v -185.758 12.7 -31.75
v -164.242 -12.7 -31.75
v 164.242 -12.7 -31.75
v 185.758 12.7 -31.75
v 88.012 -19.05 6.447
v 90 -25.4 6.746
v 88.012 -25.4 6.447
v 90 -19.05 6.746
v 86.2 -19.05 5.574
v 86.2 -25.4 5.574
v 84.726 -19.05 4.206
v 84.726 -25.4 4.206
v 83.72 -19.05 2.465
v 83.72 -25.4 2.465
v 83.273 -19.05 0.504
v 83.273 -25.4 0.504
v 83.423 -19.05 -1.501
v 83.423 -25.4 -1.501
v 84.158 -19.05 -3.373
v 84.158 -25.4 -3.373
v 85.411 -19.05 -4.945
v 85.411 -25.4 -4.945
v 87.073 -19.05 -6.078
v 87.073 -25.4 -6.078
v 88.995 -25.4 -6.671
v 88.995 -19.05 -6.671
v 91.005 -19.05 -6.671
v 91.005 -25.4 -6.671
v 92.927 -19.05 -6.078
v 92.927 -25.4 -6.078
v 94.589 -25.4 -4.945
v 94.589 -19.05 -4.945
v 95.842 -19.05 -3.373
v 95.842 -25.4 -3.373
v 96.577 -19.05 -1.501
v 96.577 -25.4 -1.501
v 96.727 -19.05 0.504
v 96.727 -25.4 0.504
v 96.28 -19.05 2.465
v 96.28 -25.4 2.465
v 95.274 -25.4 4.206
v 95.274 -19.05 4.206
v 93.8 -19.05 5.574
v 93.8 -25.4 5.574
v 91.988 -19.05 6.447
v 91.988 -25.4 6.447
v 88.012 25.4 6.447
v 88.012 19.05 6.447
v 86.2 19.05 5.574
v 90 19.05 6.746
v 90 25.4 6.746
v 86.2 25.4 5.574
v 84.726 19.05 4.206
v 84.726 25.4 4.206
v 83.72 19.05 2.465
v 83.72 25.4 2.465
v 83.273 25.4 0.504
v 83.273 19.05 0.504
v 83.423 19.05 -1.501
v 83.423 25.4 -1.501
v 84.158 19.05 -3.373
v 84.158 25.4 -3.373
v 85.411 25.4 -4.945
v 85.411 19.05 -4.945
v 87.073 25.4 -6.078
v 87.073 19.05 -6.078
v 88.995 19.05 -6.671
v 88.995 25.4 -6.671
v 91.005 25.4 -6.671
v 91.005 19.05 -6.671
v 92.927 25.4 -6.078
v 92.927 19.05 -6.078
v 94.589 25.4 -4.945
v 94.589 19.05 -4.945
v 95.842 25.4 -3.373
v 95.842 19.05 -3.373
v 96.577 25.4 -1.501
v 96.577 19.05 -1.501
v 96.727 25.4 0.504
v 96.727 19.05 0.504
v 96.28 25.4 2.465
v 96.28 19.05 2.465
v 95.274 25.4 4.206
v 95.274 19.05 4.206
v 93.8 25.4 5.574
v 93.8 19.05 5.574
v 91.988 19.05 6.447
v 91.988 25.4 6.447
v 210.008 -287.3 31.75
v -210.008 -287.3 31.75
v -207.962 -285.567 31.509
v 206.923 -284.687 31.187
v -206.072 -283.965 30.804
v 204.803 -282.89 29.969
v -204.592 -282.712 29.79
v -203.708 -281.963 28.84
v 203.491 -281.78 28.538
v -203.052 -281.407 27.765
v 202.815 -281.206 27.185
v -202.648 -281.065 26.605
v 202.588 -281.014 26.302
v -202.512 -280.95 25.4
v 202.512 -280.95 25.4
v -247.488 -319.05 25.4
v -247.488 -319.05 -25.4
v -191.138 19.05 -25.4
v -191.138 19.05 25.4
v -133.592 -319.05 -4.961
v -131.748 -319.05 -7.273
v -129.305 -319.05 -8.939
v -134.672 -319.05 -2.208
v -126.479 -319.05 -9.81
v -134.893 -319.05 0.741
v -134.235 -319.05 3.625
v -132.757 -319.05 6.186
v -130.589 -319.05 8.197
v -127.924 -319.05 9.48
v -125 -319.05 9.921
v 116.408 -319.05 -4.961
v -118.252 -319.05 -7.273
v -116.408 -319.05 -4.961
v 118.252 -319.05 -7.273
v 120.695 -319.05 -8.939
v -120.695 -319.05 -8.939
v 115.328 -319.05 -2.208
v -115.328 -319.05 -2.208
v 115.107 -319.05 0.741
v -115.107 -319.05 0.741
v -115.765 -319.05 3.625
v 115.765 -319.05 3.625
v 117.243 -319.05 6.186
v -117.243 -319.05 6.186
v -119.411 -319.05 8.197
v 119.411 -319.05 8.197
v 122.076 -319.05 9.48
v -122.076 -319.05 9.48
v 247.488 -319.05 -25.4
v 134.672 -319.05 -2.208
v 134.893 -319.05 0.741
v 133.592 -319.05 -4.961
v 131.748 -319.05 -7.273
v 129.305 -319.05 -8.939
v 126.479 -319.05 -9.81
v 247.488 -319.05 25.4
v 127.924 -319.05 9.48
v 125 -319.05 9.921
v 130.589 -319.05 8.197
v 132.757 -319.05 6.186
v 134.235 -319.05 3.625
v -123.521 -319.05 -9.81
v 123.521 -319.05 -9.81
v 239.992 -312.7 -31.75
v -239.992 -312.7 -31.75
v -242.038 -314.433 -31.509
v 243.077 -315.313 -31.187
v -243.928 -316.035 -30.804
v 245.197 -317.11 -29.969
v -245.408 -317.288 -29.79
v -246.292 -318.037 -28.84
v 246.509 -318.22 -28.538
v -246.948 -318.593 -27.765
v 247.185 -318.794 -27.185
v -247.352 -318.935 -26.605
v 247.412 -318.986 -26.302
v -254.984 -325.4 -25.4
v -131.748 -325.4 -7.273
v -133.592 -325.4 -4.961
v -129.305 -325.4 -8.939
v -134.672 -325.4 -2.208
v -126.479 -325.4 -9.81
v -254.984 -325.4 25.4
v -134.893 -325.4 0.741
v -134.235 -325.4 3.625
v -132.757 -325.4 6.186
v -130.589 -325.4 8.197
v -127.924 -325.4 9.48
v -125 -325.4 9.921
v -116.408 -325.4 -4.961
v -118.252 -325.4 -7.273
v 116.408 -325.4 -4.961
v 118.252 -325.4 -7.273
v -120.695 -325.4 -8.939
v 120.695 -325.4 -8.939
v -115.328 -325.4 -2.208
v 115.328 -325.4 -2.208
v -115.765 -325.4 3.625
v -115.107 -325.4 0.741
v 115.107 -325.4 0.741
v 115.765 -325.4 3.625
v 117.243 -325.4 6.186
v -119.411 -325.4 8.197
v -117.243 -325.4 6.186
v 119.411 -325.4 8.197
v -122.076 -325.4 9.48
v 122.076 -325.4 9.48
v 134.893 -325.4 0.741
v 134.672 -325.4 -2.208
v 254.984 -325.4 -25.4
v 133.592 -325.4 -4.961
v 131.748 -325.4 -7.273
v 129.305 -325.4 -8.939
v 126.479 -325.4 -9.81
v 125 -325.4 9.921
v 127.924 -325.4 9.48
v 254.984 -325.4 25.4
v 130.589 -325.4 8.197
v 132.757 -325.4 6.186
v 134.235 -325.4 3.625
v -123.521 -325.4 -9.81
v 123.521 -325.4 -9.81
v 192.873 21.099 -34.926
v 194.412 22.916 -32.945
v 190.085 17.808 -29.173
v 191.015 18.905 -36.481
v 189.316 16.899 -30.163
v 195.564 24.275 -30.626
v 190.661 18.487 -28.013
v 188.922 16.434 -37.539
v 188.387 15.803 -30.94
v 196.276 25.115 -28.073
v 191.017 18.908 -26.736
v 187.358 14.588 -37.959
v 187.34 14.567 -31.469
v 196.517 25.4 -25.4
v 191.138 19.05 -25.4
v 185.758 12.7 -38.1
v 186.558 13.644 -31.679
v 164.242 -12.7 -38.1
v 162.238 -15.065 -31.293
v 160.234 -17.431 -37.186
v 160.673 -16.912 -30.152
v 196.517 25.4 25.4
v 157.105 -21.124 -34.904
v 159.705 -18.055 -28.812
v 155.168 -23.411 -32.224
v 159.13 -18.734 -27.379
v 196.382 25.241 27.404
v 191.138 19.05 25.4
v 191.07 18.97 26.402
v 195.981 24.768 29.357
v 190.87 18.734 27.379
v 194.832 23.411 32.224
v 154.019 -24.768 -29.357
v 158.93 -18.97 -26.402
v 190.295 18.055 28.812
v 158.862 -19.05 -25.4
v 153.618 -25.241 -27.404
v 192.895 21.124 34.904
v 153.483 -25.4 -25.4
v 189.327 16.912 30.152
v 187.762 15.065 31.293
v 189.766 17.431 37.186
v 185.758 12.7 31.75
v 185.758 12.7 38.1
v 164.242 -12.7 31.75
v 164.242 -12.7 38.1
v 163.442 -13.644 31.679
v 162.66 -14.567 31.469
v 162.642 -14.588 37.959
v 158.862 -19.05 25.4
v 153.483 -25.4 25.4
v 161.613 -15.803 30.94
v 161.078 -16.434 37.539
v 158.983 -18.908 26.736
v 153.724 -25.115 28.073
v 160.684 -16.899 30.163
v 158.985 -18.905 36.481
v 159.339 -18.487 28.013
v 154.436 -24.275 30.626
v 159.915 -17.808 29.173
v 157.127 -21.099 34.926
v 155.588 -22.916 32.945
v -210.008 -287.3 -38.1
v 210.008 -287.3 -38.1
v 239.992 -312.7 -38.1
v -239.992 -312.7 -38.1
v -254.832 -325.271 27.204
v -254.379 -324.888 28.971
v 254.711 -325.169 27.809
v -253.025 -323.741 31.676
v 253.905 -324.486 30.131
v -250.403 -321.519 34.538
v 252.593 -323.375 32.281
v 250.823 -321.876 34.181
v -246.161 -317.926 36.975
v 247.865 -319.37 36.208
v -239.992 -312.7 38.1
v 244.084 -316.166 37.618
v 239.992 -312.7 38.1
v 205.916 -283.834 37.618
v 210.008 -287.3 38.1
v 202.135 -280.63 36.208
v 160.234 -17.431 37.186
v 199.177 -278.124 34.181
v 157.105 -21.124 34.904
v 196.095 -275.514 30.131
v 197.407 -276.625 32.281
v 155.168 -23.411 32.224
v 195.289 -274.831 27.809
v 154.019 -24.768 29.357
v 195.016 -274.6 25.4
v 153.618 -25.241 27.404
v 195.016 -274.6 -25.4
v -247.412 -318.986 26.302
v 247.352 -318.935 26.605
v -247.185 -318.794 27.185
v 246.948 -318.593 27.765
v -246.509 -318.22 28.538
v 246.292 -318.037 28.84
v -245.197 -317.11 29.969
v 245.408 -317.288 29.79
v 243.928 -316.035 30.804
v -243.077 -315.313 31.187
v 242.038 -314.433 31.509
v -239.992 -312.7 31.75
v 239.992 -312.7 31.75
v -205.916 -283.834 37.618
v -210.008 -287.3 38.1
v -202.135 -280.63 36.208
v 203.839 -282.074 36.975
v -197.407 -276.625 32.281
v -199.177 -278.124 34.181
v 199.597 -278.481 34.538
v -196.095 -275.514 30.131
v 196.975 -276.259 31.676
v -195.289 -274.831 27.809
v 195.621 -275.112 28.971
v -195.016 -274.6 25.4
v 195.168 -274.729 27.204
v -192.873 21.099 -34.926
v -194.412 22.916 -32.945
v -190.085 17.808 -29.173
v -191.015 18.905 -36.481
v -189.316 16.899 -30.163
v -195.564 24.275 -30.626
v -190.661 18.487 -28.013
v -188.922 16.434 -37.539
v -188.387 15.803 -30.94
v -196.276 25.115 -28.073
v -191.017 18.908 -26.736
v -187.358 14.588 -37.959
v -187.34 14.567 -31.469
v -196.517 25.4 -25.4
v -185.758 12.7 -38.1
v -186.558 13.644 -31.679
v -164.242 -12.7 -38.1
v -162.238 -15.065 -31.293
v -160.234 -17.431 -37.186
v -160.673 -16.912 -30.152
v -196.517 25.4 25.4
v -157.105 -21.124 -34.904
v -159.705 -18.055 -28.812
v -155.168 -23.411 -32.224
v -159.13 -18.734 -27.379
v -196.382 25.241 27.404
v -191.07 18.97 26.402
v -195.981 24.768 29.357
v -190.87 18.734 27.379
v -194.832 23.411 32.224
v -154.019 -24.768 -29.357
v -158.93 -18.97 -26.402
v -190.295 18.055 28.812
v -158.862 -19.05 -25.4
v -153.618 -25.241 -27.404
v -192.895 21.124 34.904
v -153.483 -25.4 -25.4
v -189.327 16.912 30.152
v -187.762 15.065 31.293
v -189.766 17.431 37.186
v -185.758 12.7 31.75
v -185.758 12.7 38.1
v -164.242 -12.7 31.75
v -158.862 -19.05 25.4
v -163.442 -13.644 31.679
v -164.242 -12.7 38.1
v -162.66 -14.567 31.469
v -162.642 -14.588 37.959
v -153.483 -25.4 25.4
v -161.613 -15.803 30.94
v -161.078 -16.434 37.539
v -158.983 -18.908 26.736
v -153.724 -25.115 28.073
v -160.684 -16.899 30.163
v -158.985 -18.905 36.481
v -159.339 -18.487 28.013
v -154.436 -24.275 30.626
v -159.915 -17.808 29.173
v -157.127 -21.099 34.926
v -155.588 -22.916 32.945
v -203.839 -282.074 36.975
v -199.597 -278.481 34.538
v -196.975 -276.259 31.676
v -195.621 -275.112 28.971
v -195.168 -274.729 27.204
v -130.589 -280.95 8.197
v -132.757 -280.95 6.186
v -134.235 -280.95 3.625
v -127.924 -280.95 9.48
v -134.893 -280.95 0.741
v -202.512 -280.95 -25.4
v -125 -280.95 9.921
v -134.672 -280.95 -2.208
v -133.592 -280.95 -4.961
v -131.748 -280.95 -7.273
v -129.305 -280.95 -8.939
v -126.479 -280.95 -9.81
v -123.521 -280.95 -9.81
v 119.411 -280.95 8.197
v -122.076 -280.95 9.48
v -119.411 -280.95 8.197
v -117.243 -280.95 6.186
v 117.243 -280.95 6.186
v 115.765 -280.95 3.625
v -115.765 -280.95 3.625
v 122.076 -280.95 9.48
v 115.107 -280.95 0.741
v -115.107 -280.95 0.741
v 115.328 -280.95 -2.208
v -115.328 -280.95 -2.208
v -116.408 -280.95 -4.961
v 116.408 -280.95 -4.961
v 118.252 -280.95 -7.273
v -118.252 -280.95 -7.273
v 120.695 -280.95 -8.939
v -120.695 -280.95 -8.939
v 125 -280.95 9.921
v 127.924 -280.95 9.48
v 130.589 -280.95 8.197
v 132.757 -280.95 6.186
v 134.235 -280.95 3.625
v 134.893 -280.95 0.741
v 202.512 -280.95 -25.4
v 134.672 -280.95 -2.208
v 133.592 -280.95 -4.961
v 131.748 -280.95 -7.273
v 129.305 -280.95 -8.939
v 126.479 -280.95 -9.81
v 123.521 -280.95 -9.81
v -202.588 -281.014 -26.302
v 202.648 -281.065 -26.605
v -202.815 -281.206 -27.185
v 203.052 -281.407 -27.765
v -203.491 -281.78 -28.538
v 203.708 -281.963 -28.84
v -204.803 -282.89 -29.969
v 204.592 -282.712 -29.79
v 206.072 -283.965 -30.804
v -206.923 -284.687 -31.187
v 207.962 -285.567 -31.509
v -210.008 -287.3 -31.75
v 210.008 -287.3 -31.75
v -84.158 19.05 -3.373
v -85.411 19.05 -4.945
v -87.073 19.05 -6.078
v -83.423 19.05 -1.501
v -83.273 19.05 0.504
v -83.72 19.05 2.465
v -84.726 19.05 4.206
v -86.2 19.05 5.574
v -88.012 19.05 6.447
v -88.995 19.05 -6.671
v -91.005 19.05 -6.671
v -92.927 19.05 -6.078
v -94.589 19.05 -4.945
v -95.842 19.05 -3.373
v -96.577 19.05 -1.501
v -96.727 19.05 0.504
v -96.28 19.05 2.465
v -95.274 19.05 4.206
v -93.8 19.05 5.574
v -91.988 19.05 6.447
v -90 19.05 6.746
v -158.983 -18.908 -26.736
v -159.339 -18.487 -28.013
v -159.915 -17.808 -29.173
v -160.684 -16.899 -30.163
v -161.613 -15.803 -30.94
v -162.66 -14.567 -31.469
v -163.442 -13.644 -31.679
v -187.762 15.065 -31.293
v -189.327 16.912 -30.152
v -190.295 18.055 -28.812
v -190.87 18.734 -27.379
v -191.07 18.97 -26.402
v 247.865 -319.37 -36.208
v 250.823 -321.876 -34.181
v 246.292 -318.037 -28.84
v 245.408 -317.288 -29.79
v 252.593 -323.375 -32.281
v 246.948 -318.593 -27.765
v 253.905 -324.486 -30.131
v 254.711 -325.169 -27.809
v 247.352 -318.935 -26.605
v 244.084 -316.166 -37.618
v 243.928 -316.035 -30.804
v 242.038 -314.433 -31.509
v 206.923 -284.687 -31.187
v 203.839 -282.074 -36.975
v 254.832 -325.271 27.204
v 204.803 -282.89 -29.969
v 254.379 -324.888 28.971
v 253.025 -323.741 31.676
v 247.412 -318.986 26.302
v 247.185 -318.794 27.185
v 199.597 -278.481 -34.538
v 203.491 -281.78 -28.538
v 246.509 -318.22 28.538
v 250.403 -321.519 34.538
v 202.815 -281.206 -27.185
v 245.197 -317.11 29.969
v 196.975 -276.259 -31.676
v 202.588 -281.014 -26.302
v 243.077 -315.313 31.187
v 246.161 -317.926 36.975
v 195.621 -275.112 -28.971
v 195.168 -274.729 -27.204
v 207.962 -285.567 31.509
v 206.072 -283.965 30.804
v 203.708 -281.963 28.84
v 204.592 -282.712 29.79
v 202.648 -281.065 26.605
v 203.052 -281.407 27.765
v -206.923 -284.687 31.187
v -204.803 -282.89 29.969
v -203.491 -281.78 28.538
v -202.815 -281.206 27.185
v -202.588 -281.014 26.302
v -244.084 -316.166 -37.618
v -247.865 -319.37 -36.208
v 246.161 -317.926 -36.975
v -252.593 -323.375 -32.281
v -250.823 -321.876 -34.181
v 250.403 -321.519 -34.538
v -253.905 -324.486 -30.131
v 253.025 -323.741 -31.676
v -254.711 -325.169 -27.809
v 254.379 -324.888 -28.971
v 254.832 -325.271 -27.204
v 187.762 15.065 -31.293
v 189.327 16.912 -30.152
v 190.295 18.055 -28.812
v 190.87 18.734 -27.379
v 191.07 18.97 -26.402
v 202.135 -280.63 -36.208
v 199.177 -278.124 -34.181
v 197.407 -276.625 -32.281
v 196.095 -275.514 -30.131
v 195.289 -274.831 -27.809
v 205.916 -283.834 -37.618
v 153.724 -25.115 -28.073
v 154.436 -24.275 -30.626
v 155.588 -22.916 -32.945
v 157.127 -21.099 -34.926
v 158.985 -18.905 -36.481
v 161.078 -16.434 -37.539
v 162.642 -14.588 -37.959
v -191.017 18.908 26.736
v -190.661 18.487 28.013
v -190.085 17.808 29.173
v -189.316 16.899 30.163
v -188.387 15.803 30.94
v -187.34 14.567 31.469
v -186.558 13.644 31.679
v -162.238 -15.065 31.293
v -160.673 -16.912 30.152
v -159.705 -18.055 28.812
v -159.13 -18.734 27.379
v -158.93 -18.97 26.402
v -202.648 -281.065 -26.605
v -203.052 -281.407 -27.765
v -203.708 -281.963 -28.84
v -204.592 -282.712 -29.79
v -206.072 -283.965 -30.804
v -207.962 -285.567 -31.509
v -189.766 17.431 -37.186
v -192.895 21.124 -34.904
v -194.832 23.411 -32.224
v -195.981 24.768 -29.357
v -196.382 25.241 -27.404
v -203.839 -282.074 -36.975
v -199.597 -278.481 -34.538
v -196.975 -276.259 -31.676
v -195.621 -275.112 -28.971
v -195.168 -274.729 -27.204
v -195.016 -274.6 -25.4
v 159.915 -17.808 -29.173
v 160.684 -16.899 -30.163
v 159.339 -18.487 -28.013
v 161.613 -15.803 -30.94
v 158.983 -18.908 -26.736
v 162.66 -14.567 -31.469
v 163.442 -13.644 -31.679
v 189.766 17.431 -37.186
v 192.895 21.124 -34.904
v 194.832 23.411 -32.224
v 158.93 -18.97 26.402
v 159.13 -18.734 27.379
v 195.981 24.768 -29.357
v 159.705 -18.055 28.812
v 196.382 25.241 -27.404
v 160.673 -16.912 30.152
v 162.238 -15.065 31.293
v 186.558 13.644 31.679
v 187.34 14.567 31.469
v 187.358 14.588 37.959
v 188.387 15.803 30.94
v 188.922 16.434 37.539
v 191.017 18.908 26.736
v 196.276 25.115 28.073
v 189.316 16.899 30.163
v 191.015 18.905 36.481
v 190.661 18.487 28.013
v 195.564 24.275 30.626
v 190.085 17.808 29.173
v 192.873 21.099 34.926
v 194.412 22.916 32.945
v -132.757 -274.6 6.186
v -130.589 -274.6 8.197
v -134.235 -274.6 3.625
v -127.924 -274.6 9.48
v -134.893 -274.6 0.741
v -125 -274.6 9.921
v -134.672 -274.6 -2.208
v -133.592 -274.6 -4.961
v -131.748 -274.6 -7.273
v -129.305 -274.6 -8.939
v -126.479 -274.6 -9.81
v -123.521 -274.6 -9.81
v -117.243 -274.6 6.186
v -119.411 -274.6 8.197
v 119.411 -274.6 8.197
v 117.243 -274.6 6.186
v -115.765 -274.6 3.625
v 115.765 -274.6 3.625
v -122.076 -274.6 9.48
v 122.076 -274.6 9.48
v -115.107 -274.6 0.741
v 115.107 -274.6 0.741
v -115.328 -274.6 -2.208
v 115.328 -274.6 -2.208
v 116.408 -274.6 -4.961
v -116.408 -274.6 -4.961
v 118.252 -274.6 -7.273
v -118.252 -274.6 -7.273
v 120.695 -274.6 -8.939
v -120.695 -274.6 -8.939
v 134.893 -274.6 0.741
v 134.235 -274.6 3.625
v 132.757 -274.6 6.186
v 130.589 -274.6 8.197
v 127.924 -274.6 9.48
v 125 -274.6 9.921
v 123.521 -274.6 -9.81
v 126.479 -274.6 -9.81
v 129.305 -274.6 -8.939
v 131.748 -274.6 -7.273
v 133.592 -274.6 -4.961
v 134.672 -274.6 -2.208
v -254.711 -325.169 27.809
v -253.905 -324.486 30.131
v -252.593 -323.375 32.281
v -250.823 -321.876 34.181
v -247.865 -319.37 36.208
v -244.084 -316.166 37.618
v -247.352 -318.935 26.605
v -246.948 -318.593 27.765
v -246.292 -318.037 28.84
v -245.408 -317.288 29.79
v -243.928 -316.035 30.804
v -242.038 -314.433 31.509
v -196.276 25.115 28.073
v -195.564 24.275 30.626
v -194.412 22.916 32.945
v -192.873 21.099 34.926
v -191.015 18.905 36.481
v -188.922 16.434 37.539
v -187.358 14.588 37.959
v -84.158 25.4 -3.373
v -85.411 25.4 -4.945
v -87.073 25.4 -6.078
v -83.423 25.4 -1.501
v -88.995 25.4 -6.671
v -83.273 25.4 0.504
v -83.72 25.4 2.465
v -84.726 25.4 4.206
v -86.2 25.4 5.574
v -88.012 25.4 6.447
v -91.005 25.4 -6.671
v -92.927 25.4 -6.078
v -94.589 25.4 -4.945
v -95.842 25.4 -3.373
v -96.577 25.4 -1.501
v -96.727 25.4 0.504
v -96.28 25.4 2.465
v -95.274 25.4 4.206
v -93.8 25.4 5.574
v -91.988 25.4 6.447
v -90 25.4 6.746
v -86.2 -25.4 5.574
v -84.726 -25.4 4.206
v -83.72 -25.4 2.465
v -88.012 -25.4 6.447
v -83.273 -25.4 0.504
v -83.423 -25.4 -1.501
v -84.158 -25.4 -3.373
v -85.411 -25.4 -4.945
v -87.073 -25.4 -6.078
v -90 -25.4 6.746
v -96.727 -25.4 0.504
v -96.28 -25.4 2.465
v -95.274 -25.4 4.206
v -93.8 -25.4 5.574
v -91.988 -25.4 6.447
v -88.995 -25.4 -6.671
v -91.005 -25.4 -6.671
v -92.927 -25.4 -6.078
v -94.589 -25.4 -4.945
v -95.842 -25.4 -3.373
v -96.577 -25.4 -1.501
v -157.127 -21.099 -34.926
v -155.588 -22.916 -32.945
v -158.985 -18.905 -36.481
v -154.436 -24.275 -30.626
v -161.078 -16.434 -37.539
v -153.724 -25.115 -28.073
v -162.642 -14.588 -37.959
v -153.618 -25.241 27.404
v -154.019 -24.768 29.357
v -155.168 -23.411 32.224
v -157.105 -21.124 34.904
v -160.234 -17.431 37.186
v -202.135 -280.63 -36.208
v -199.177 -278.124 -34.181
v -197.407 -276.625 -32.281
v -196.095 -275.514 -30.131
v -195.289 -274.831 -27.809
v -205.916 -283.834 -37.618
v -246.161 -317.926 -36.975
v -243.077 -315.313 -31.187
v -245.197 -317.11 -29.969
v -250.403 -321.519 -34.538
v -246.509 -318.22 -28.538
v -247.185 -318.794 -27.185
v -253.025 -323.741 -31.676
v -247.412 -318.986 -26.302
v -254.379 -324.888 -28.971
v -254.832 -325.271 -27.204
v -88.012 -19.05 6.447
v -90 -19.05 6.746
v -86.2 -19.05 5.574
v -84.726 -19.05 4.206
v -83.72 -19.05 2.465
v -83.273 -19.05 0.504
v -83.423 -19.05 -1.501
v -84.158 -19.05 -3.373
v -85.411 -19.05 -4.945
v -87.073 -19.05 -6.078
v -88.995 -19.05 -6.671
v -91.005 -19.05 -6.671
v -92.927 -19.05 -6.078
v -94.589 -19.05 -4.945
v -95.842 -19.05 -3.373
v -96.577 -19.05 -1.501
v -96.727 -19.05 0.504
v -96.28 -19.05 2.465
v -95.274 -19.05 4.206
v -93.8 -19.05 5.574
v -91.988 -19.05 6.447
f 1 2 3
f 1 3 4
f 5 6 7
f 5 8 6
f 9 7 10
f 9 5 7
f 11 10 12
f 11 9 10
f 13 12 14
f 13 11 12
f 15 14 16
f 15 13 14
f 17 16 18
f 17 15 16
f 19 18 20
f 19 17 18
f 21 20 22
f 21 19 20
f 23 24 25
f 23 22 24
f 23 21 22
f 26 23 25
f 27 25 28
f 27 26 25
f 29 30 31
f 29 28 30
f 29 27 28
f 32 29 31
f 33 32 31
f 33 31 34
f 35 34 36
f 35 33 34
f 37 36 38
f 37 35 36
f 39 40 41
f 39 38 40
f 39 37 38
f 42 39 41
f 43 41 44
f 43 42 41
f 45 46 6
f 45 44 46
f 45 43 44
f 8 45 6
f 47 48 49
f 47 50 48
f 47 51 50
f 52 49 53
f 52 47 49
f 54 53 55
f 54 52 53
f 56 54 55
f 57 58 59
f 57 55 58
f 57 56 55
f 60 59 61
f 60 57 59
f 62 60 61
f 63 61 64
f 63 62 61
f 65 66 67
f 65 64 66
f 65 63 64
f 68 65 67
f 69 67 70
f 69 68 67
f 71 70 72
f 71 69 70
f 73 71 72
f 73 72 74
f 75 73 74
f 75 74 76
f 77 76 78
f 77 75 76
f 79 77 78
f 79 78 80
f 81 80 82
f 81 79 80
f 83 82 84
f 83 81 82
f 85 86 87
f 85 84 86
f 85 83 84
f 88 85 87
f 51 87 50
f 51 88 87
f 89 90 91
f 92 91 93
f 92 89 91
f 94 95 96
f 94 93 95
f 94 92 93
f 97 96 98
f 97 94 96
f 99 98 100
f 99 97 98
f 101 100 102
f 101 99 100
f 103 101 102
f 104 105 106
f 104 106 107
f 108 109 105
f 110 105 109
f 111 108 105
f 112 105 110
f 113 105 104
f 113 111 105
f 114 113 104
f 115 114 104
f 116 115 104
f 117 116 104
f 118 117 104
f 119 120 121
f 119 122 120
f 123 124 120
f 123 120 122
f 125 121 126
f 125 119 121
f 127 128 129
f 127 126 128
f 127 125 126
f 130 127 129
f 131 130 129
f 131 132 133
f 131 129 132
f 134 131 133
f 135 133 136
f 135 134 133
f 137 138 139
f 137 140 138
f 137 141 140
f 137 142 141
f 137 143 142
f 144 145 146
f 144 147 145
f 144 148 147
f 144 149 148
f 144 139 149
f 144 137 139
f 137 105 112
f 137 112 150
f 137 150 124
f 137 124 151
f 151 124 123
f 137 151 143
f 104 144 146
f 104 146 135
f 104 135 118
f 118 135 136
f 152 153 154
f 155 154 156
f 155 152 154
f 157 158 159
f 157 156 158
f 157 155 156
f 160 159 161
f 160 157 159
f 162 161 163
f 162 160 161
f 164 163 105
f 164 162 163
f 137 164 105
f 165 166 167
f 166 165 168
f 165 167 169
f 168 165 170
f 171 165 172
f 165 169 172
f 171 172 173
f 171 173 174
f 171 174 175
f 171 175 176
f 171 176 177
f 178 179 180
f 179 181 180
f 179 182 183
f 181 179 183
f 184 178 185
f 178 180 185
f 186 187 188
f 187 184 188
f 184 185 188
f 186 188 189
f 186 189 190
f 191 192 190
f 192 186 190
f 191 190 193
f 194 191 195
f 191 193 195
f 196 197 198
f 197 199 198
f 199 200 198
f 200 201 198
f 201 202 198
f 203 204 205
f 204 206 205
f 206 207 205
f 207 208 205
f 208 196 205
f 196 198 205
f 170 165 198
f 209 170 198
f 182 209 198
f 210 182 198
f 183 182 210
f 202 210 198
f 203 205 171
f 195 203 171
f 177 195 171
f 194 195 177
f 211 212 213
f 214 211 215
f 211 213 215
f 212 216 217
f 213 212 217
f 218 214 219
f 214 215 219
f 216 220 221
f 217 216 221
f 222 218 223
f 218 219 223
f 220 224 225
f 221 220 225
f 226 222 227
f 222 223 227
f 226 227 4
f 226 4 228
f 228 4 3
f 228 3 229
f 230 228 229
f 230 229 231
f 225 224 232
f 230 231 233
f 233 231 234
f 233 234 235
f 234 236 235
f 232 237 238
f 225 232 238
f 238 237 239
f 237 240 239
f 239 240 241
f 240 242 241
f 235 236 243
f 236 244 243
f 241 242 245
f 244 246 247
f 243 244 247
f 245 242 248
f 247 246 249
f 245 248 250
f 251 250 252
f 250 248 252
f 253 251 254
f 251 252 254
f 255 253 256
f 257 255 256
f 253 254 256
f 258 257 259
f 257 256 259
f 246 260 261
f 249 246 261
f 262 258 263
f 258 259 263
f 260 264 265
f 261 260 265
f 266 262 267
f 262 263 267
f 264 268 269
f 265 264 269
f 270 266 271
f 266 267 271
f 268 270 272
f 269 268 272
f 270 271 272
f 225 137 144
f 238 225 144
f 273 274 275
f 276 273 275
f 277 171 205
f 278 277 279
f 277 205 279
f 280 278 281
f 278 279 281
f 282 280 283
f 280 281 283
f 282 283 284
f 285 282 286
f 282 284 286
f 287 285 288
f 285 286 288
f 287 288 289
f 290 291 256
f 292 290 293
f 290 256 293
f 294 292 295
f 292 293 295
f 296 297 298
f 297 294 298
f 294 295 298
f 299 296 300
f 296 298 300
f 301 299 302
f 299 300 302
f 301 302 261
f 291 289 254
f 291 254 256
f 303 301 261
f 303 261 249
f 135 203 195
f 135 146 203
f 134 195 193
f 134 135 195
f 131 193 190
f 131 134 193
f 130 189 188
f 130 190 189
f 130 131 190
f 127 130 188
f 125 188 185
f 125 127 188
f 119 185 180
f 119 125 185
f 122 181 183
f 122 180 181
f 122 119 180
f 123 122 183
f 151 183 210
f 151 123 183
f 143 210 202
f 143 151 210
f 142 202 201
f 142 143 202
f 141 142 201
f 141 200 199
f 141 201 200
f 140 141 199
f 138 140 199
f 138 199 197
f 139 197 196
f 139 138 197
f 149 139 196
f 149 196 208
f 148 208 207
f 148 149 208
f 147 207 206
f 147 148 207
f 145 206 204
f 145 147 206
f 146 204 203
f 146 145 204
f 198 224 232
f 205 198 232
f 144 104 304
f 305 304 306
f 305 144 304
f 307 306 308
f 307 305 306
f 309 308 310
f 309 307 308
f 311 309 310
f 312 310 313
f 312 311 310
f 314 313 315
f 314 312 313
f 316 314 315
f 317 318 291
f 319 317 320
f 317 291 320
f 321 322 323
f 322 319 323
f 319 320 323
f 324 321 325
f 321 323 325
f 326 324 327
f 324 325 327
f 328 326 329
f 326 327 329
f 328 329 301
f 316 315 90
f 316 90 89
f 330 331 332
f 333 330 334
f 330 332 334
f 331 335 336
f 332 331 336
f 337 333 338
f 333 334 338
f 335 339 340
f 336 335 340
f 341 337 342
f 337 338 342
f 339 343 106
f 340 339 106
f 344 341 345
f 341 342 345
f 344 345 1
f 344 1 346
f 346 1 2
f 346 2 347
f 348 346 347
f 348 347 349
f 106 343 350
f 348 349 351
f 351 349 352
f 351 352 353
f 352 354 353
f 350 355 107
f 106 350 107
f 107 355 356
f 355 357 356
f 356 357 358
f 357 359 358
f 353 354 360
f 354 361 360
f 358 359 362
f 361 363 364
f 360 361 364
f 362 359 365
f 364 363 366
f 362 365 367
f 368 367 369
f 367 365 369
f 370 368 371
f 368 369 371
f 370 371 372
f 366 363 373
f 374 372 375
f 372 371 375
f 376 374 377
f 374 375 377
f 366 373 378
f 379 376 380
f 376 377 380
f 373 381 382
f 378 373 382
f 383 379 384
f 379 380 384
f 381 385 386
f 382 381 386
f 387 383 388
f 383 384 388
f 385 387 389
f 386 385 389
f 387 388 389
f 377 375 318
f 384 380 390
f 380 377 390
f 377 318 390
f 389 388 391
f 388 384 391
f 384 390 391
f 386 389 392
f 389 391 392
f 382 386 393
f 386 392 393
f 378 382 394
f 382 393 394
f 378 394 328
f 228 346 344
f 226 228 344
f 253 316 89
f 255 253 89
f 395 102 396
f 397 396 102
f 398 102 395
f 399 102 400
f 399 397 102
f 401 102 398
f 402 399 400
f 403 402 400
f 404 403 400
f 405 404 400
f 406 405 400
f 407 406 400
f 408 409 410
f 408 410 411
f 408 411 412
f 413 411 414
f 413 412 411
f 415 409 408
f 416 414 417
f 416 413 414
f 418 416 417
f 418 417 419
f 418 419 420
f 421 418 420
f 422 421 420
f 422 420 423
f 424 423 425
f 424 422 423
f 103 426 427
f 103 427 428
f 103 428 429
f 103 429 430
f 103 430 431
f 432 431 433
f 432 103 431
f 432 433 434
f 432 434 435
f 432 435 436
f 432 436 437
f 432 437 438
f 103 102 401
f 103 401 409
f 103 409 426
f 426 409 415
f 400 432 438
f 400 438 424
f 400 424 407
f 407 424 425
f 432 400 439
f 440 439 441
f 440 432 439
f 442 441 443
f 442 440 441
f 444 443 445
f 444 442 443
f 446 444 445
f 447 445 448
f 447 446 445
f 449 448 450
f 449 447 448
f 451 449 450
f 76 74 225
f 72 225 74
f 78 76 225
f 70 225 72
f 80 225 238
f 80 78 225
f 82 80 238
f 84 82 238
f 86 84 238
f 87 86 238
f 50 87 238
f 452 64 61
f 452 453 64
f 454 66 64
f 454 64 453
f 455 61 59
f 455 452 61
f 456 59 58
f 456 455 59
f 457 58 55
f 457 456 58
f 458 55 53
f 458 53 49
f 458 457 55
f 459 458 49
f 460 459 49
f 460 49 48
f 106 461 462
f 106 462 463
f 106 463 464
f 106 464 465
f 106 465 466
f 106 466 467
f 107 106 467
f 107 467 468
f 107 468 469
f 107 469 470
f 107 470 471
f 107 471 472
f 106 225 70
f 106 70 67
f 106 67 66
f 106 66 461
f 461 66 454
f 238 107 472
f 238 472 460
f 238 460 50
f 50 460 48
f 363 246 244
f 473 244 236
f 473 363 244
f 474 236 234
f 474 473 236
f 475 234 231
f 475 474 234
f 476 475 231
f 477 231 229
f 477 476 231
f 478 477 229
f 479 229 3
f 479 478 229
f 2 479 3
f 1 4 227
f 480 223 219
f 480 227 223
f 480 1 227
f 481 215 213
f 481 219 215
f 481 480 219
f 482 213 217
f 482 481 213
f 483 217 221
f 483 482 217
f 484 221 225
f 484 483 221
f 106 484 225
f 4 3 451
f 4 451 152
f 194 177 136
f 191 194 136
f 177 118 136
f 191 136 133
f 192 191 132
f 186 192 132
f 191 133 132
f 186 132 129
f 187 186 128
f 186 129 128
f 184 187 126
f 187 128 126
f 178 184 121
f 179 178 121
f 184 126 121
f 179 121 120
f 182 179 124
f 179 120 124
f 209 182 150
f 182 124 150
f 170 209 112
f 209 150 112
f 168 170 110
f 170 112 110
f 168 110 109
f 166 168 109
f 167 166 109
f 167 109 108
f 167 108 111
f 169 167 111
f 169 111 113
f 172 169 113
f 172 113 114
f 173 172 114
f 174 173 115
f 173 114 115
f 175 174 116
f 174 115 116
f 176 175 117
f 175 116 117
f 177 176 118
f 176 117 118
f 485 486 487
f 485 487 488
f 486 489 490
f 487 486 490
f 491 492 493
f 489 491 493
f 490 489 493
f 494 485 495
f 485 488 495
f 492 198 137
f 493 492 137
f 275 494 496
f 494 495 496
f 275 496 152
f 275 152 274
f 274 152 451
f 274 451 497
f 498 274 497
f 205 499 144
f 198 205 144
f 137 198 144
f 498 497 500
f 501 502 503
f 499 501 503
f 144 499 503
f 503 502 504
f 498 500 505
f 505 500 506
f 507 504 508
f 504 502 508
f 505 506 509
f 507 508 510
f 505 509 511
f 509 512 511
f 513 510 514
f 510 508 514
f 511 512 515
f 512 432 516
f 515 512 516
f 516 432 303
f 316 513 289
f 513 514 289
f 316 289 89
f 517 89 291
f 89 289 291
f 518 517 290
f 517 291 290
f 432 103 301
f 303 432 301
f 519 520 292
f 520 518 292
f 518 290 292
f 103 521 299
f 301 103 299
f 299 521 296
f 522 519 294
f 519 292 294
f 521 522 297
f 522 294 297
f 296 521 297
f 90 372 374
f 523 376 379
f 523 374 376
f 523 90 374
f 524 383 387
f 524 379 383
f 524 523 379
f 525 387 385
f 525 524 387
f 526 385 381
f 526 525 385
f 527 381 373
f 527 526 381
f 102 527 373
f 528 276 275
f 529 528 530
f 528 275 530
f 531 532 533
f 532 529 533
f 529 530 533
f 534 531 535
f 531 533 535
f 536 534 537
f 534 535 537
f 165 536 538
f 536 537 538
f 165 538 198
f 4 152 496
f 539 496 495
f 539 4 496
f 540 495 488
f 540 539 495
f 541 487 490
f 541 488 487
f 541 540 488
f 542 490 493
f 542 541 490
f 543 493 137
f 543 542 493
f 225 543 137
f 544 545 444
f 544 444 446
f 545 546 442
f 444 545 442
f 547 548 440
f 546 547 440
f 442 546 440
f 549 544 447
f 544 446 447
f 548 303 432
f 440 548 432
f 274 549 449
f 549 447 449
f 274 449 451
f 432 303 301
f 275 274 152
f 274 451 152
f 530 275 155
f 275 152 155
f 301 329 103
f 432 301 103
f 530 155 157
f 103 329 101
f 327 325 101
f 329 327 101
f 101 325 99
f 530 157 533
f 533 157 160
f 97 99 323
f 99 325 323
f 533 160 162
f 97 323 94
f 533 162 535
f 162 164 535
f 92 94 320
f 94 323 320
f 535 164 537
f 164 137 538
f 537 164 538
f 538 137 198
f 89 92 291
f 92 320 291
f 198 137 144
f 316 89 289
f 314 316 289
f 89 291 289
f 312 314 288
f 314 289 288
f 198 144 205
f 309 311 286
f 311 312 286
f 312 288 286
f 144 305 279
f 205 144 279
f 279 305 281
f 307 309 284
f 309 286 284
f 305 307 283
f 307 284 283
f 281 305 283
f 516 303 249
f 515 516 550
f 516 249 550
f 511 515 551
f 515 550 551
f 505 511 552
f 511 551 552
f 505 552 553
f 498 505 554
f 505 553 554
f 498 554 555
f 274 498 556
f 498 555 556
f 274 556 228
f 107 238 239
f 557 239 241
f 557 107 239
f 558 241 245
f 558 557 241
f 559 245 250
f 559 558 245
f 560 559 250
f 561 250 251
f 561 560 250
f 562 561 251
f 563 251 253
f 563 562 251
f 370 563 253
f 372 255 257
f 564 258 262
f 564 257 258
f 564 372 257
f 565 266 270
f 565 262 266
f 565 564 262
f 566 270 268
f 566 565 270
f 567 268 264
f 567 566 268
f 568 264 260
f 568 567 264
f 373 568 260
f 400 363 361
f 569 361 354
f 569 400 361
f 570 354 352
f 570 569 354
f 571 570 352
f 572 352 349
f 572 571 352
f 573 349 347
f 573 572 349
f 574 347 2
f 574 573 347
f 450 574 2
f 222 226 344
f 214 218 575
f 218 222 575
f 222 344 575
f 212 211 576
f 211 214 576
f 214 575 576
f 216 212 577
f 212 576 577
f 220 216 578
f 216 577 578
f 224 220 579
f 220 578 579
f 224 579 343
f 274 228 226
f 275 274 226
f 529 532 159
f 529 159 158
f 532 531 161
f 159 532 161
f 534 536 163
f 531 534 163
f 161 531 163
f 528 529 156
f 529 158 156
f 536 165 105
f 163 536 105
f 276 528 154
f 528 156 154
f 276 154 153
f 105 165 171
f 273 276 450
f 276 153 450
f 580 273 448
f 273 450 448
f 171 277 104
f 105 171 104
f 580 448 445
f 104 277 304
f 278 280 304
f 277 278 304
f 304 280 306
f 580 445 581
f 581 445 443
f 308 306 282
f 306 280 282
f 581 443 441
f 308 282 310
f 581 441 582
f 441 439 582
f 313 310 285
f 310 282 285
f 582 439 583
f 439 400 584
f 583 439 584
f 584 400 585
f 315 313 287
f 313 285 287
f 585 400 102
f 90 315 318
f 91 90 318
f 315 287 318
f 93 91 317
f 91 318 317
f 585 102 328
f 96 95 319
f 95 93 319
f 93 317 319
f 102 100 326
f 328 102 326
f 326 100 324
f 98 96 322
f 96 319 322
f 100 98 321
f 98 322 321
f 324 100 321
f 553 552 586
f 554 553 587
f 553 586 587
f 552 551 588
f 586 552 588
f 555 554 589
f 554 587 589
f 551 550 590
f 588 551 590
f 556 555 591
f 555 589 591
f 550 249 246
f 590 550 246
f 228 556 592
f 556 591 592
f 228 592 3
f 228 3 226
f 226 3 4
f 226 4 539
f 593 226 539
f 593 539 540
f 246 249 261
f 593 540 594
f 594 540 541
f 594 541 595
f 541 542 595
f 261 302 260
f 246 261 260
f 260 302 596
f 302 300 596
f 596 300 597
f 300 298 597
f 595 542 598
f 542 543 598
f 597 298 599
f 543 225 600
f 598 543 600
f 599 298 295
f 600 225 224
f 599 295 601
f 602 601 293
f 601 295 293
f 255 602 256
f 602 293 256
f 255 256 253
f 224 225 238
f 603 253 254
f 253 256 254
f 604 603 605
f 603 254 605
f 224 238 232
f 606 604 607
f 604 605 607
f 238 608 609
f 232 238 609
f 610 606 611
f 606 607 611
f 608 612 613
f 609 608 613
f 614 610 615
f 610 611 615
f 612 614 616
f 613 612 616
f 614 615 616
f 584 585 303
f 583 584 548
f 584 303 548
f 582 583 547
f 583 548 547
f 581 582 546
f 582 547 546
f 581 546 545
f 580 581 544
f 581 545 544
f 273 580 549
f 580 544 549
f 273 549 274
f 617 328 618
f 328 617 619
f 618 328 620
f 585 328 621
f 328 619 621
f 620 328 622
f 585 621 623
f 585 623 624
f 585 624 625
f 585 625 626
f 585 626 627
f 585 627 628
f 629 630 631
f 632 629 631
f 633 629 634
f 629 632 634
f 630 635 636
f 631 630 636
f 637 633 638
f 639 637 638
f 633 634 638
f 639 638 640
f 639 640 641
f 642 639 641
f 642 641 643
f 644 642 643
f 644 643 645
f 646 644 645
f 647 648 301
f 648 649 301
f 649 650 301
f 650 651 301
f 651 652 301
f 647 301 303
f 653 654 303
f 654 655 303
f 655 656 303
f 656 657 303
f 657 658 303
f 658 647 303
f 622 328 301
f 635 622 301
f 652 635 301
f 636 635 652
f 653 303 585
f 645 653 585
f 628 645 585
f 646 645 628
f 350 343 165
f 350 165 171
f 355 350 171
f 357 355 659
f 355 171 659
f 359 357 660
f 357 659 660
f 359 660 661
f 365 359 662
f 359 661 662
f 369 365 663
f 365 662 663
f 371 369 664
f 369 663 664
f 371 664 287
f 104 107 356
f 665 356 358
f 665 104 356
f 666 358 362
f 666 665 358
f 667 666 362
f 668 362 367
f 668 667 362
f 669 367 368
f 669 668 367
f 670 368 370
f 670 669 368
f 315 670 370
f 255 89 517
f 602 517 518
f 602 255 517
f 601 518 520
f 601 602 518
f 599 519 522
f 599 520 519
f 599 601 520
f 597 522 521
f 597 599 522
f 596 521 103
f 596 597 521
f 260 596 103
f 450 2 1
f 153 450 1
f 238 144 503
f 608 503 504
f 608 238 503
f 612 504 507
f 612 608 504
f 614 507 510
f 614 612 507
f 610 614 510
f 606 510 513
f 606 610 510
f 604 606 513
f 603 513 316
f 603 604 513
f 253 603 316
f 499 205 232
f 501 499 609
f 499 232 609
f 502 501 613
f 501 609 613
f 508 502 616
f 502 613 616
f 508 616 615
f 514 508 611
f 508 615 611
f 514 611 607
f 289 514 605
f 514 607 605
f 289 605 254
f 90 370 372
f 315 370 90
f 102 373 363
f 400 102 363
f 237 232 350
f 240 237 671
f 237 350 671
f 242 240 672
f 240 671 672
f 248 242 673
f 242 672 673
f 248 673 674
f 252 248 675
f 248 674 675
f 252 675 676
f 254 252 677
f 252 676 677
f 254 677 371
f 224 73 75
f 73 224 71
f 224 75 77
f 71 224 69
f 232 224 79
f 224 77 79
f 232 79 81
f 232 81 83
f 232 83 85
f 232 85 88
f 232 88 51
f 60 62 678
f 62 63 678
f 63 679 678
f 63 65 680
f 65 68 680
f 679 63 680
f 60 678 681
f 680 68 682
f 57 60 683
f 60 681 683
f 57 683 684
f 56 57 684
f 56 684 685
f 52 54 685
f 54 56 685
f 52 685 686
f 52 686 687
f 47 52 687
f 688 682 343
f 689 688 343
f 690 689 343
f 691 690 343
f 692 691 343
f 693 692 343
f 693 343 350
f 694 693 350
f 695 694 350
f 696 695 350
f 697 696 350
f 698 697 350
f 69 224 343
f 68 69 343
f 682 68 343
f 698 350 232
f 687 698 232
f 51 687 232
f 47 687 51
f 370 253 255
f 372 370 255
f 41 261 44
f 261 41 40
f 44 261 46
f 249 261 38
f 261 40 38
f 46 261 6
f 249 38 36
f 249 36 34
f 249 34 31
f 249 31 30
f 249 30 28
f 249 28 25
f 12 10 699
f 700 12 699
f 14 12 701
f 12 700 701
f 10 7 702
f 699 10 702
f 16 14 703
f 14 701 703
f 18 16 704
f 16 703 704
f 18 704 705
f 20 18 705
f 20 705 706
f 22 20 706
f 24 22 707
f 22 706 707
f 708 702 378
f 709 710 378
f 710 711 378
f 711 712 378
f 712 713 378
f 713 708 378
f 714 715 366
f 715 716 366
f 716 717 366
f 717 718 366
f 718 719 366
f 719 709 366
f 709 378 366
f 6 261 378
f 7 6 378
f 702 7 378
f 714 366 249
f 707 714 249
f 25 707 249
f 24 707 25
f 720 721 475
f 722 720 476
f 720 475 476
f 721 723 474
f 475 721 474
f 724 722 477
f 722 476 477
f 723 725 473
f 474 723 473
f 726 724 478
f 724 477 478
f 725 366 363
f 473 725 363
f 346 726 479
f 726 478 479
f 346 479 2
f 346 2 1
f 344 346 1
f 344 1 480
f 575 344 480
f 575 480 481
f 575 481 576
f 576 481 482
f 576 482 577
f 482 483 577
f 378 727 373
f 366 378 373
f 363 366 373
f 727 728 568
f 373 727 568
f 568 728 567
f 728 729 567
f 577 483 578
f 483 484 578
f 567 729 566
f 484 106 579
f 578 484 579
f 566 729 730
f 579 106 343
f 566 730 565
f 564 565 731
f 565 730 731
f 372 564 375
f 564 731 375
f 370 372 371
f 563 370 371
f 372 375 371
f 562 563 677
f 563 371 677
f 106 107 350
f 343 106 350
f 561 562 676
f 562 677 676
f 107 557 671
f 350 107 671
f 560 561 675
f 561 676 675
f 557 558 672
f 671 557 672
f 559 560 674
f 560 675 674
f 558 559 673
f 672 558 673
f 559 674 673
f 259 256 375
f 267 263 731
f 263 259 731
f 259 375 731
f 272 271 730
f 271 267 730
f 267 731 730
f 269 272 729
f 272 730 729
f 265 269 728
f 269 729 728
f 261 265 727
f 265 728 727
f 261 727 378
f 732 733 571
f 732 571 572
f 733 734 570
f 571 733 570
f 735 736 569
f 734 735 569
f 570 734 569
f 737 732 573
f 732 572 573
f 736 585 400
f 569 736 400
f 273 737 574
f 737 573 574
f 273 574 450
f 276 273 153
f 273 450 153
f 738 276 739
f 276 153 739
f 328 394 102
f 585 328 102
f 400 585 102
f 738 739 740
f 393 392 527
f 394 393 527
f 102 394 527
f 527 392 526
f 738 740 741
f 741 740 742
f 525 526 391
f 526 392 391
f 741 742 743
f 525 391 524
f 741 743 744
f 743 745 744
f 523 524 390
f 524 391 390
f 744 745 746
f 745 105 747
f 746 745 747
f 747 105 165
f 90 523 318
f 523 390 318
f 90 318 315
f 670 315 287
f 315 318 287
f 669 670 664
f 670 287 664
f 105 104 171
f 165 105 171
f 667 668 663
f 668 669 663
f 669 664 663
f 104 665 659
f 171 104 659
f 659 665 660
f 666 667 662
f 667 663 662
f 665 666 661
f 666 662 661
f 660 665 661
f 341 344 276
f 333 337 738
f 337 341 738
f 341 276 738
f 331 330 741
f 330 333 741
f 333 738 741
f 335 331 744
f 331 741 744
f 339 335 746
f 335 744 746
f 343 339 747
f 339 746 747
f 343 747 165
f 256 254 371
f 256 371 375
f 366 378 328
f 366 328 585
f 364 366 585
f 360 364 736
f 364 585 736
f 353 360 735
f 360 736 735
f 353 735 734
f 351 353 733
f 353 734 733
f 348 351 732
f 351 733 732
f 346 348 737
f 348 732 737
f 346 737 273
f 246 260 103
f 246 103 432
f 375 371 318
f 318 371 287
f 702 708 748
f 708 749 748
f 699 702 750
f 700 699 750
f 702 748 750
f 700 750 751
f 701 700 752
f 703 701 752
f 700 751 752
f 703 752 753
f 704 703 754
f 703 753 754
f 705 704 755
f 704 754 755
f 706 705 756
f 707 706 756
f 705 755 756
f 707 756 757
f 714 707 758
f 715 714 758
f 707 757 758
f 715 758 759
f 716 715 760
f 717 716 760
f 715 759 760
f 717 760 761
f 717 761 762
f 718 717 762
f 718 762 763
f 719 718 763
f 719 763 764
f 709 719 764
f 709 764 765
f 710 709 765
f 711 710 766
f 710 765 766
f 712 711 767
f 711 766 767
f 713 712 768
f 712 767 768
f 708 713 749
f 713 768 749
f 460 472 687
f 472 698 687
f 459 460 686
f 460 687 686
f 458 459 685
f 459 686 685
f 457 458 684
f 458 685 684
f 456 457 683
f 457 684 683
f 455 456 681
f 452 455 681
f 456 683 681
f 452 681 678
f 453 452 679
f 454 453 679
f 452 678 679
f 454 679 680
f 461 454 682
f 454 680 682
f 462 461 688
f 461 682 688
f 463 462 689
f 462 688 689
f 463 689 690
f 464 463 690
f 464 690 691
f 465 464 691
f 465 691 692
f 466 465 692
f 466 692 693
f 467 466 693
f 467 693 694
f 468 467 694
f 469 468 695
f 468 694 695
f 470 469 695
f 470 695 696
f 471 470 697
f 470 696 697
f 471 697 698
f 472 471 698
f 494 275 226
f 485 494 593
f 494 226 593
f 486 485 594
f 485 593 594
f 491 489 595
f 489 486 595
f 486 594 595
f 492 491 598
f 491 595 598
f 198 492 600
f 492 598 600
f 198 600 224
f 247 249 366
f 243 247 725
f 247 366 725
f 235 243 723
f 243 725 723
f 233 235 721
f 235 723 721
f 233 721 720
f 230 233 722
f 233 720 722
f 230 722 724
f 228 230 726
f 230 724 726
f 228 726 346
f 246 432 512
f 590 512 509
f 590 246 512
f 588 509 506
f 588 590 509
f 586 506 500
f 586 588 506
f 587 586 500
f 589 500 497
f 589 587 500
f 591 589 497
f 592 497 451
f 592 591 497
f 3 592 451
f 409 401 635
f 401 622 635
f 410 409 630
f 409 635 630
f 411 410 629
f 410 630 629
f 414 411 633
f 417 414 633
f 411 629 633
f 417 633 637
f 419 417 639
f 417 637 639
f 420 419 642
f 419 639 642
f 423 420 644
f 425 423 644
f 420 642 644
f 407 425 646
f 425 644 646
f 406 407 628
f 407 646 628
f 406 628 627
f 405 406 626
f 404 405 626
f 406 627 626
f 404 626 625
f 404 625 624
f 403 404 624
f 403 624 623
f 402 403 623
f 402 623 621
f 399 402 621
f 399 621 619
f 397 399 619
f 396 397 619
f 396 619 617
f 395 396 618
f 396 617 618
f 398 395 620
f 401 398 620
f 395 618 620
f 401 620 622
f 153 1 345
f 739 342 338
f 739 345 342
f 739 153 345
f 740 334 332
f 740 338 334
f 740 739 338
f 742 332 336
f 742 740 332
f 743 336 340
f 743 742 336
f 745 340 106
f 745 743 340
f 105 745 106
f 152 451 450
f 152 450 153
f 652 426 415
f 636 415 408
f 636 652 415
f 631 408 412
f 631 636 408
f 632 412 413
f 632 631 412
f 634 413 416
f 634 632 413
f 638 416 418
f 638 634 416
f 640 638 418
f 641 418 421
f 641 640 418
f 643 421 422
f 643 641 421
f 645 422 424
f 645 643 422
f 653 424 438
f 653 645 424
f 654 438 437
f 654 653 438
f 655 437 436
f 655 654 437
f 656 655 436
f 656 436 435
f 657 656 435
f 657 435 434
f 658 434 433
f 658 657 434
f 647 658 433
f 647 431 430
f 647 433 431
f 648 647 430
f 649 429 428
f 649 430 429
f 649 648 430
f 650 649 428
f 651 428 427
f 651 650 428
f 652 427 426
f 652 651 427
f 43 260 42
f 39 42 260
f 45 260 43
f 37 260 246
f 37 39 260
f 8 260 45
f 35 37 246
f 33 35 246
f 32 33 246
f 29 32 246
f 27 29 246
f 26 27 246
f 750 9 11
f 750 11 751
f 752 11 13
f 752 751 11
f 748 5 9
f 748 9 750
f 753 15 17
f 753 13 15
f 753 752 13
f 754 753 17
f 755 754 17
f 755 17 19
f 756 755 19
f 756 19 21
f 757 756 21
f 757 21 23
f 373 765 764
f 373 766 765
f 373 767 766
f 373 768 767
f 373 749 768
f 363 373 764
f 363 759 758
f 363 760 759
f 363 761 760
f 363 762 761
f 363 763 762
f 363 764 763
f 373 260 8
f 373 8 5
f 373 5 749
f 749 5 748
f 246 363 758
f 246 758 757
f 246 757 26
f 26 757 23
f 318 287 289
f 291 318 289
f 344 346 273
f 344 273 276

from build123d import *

# Parameters (mm, degrees)
STRUCTURAL_MEMBER1_DEPTH      = 389.790363618
STRUCTURAL_MEMBER1_DEPTH_BACK = 39.790363618
STRUCTURAL_MEMBER1_2_DEPTH    = 398.982350083
STRUCTURAL_MEMBER1_3_DEPTH    = 560.107719899
STRUCTURAL_MEMBER1_4_DEPTH    = 398.982350083


with BuildPart() as part:
    # Sketch141 → Structural Member1 (new, two sides: drawn at the far end of the back side and taken through both)
    with BuildSketch(Plane.YZ.offset(-175).offset(-STRUCTURAL_MEMBER1_DEPTH_BACK)):
        with BuildLine():
            Line((-12.699978, -38.1), (12.699978, -38.1))
            ThreePointArc((12.699978, -38.1), (21.680234121, -34.380256121), (25.399978, -25.4))
            Line((25.399978, -25.4), (25.399978, 25.4))
            ThreePointArc((25.399978, 25.4), (21.680234121, 34.380256121), (12.699978, 38.1))
            Line((12.699978, 38.1), (-12.699978, 38.1))
            ThreePointArc((-12.699978, 38.1), (-21.680234121, 34.380256121), (-25.399978, 25.4))
            Line((-25.399978, 25.4), (-25.399978, -25.4))
            ThreePointArc((-25.399978, -25.4), (-21.680234121, -34.380256121), (-12.699978, -38.1))
        make_face()
        with BuildLine():
            Line((-12.699978, -31.75), (12.699978, -31.75))
            ThreePointArc((12.699978, -31.75), (17.190106061, -29.890128061), (19.049978, -25.4))
            Line((19.049978, -25.4), (19.049978, 25.4))
            ThreePointArc((19.049978, 25.4), (17.190106061, 29.890128061), (12.699978, 31.75))
            Line((12.699978, 31.75), (-12.699978, 31.75))
            ThreePointArc((-12.699978, 31.75), (-17.190106061, 29.890128061), (-19.049978, 25.4))
            Line((-19.049978, 25.4), (-19.049978, -25.4))
            ThreePointArc((-19.049978, -25.4), (-17.190106061, -29.890128061), (-12.699978, -31.75))
        make_face(mode=Mode.SUBTRACT)
    extrude(amount=STRUCTURAL_MEMBER1_DEPTH + STRUCTURAL_MEMBER1_DEPTH_BACK)

    # Structural Member1 mitre 1
    split(bisect_by=Plane(origin=(-175, 0, 0), x_dir=(-0.646374896, 0.763019982, 0), z_dir=(0.763019982, 0.646374896, 0)), keep=Keep.TOP)

    # Structural Member1 mitre 2
    split(bisect_by=Plane(origin=(175, 0, 0), x_dir=(-0.646374896, -0.763019982, 0), z_dir=(-0.763019982, 0.646374896, 0)), keep=Keep.TOP)

    # Sketch143 → 1/2 Clearance Hole1 (revolve, cut)
    with BuildSketch(Plane(origin=(90, 25.399978, 0), x_dir=(0, 0, 1), z_dir=(1, 0, 0))):
        Polygon((0, 0), (0, 54.853549943), (6.74624, 50.8), (6.74624, 0), align=None)
    f_1_2_clearance_hole1 = revolve(axis=Axis((90, 31.749978, 0), (0, -1, 0)), mode=Mode.SUBTRACT)

    # Mirror1: 1/2 Clearance Hole1 across plane
    add(f_1_2_clearance_hole1.mirror(Plane(origin=(0, 0, 0), x_dir=(0, 0, 1), z_dir=(1, 0, 0))), mode=Mode.SUBTRACT)


with BuildPart() as body_2:
    # Sketch141 on segment 2 (carried to segment 2) → Structural Member1 2 (new body)
    with BuildSketch(Plane(origin=(168.458504517, 39.2489729, 0), x_dir=(0.986393924, 0.164398987, 0), z_dir=(0.164398987, -0.986393924, 0))):
        with BuildLine():
            Line((-12.699978, -38.1), (12.699978, -38.1))
            ThreePointArc((12.699978, -38.1), (21.680234121, -34.380256121), (25.399978, -25.4))
            Line((25.399978, -25.4), (25.399978, 25.4))
            ThreePointArc((25.399978, 25.4), (21.680234121, 34.380256121), (12.699978, 38.1))
            Line((12.699978, 38.1), (-12.699978, 38.1))
            ThreePointArc((-12.699978, 38.1), (-21.680234121, 34.380256121), (-25.399978, 25.4))
            Line((-25.399978, 25.4), (-25.399978, -25.4))
            ThreePointArc((-25.399978, -25.4), (-21.680234121, -34.380256121), (-12.699978, -38.1))
        make_face()
        with BuildLine():
            Line((-12.699978, -31.75), (12.699978, -31.75))
            ThreePointArc((12.699978, -31.75), (17.190106061, -29.890128061), (19.049978, -25.4))
            Line((19.049978, -25.4), (19.049978, 25.4))
            ThreePointArc((19.049978, 25.4), (17.190106061, 29.890128061), (12.699978, 31.75))
            Line((12.699978, 31.75), (-12.699978, 31.75))
            ThreePointArc((-12.699978, 31.75), (-17.190106061, 29.890128061), (-19.049978, 25.4))
            Line((-19.049978, 25.4), (-19.049978, -25.4))
            ThreePointArc((-19.049978, -25.4), (-17.190106061, -29.890128061), (-12.699978, -31.75))
        make_face(mode=Mode.SUBTRACT)
    extrude(amount=STRUCTURAL_MEMBER1_2_DEPTH)

    # Structural Member1 2 mitre 1
    split(bisect_by=Plane(origin=(175, 0, 0), x_dir=(0.646374896, 0.763019982, 0), z_dir=(0.763019982, -0.646374896, 0)), keep=Keep.TOP)

    # Structural Member1 2 mitre 2
    split(bisect_by=Plane(origin=(225, -300, 0), x_dir=(-0.763019982, 0.646374896, 0), z_dir=(0.646374896, 0.763019982, 0)), keep=Keep.TOP)


with BuildPart() as body_3:
    # Sketch141 on segment 3 (carried to segment 3) → Structural Member1 3 (new body)
    with BuildSketch(Plane(origin=(280.05385995, -300, 0), x_dir=(0, -1, 0), z_dir=(-1, 0, 0))):
        with BuildLine():
            Line((-12.699978, -38.1), (12.699978, -38.1))
            ThreePointArc((12.699978, -38.1), (21.680234121, -34.380256121), (25.399978, -25.4))
            Line((25.399978, -25.4), (25.399978, 25.4))
            ThreePointArc((25.399978, 25.4), (21.680234121, 34.380256121), (12.699978, 38.1))
            Line((12.699978, 38.1), (-12.699978, 38.1))
            ThreePointArc((-12.699978, 38.1), (-21.680234121, 34.380256121), (-25.399978, 25.4))
            Line((-25.399978, 25.4), (-25.399978, -25.4))
            ThreePointArc((-25.399978, -25.4), (-21.680234121, -34.380256121), (-12.699978, -38.1))
        make_face()
        with BuildLine():
            Line((-12.699978, -31.75), (12.699978, -31.75))
            ThreePointArc((12.699978, -31.75), (17.190106061, -29.890128061), (19.049978, -25.4))
            Line((19.049978, -25.4), (19.049978, 25.4))
            ThreePointArc((19.049978, 25.4), (17.190106061, 29.890128061), (12.699978, 31.75))
            Line((12.699978, 31.75), (-12.699978, 31.75))
            ThreePointArc((-12.699978, 31.75), (-17.190106061, 29.890128061), (-19.049978, 25.4))
            Line((-19.049978, 25.4), (-19.049978, -25.4))
            ThreePointArc((-19.049978, -25.4), (-17.190106061, -29.890128061), (-12.699978, -31.75))
        make_face(mode=Mode.SUBTRACT)
    extrude(amount=STRUCTURAL_MEMBER1_3_DEPTH)

    # Structural Member1 3 mitre 1
    split(bisect_by=Plane(origin=(225, -300, 0), x_dir=(0.763019982, -0.646374896, 0), z_dir=(-0.646374896, -0.763019982, 0)), keep=Keep.TOP)

    # Structural Member1 3 mitre 2
    split(bisect_by=Plane(origin=(-225, -300, 0), x_dir=(0.763019982, 0.646374896, 0), z_dir=(0.646374896, -0.763019982, 0)), keep=Keep.TOP)

    # Sketch144 → 3/4 Clearance Hole2 (revolve, cut)
    with BuildSketch(Plane(origin=(125, -274.600022, 0), x_dir=(0, 0, 1), z_dir=(1, 0, 0))):
        Polygon((0, 0), (0, 56.761282408), (9.92124, 50.8), (9.92124, 0), align=None)
    f_3_4_clearance_hole2 = revolve(axis=Axis((125, -268.250022, 0), (0, -1, 0)), mode=Mode.SUBTRACT)

    # Mirror2: 3/4 Clearance Hole2 across plane
    add(f_3_4_clearance_hole2.mirror(Plane(origin=(0, 0, 0), x_dir=(0, 0, 1), z_dir=(1, 0, 0))), mode=Mode.SUBTRACT)


with BuildPart() as body_4:
    # Sketch141 on segment 4 (carried to segment 4) → Structural Member1 4 (new body)
    with BuildSketch(Plane(origin=(-234.050798823, -354.304792938, 0), x_dir=(-0.986393924, 0.164398987, 0), z_dir=(0.164398987, 0.986393924, 0))):
        with BuildLine():
            Line((-12.699978, -38.1), (12.699978, -38.1))
            ThreePointArc((12.699978, -38.1), (21.680234121, -34.380256121), (25.399978, -25.4))
            Line((25.399978, -25.4), (25.399978, 25.4))
            ThreePointArc((25.399978, 25.4), (21.680234121, 34.380256121), (12.699978, 38.1))
            Line((12.699978, 38.1), (-12.699978, 38.1))
            ThreePointArc((-12.699978, 38.1), (-21.680234121, 34.380256121), (-25.399978, 25.4))
            Line((-25.399978, 25.4), (-25.399978, -25.4))
            ThreePointArc((-25.399978, -25.4), (-21.680234121, -34.380256121), (-12.699978, -38.1))
        make_face()
        with BuildLine():
            Line((-12.699978, -31.75), (12.699978, -31.75))
            ThreePointArc((12.699978, -31.75), (17.190106061, -29.890128061), (19.049978, -25.4))
            Line((19.049978, -25.4), (19.049978, 25.4))
            ThreePointArc((19.049978, 25.4), (17.190106061, 29.890128061), (12.699978, 31.75))
            Line((12.699978, 31.75), (-12.699978, 31.75))
            ThreePointArc((-12.699978, 31.75), (-17.190106061, 29.890128061), (-19.049978, 25.4))
            Line((-19.049978, 25.4), (-19.049978, -25.4))
            ThreePointArc((-19.049978, -25.4), (-17.190106061, -29.890128061), (-12.699978, -31.75))
        make_face(mode=Mode.SUBTRACT)
    extrude(amount=STRUCTURAL_MEMBER1_4_DEPTH)

    # Structural Member1 4 mitre 1
    split(bisect_by=Plane(origin=(-225, -300, 0), x_dir=(-0.763019982, -0.646374896, 0), z_dir=(-0.646374896, 0.763019982, 0)), keep=Keep.TOP)

    # Structural Member1 4 mitre 2
    split(bisect_by=Plane(origin=(-175, 0, 0), x_dir=(0.646374896, -0.763019982, 0), z_dir=(-0.763019982, -0.646374896, 0)), keep=Keep.TOP)


solid = Compound([part.part, body_2.part, body_3.part, body_4.part])
